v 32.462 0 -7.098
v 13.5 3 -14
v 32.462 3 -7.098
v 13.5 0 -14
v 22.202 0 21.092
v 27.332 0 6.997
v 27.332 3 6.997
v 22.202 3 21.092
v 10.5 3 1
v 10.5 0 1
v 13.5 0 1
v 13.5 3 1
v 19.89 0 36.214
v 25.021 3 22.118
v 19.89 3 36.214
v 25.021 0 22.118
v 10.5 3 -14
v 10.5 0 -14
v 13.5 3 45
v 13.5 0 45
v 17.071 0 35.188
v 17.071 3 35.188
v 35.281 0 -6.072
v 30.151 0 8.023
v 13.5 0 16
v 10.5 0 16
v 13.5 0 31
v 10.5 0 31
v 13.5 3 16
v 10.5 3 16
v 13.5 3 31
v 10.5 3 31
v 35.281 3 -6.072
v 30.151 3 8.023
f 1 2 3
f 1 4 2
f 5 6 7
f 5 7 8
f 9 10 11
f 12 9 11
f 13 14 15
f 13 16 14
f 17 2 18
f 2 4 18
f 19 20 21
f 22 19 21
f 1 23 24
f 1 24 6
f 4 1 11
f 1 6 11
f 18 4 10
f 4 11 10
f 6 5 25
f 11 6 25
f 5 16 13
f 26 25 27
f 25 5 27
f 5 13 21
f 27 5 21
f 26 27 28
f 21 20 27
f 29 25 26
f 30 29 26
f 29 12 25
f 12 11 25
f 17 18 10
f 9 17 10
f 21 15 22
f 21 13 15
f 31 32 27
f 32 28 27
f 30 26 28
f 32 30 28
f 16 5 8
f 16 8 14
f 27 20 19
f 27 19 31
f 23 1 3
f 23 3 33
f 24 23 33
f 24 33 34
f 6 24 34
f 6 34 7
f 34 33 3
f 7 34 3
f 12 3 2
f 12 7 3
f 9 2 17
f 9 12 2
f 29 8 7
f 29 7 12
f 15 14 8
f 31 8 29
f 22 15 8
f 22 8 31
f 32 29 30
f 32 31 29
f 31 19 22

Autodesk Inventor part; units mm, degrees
ref_plane "YZ Plane" through (0, 0, 0) normal (1, 0, 0) x (0, 1, 0)
ref_plane "XZ Plane" through (0, 0, 0) normal (0, 1, 0) x (-1, 0, 0)
ref_plane "XY Plane" through (0, 0, 0) normal (0, 0, 1) x (1, 0, 0)
sketch "Sketch1" plane through (0, 0, 0) normal (0, 1, 0) x (-1, 0, 0)
  line L0 (-13.5, -14) -> (-32.4622, -7.0983)
  line L1 (-13.5, -14) -> (-10.5, -14)
  line L2 (-10.5, -14) -> (-10.5, 1)
  line L3 (-10.5, 1) -> (-13.5, 1)
  line L4 (-13.5, 1) -> (-13.5, 16)
  line L5 (-13.5, 16) -> (-10.5, 16)
  line L6 (-10.5, 16) -> (-10.5, 31)
  line L7 (-10.5, 31) -> (-13.5, 31)
  line L8 (-13.5, 45) -> (-13.5, 31)
  line L9 (-13.5, 16) -> (-13.5, 1)
  line L10 (-32.4622, -7.0983) -> (-35.2813, -6.0723)
  line L11 (-35.2813, -6.0723) -> (-30.151, 8.0231)
  line L12 (-30.151, 8.0231) -> (-27.3319, 6.9971)
  line L13 (-27.3319, 6.9971) -> (-22.2016, 21.0925)
  line L14 (-22.2016, 21.0925) -> (-25.0207, 22.1185)
  line L15 (-25.0207, 22.1185) -> (-19.8904, 36.2139)
  line L16 (-19.8904, 36.2139) -> (-17.0713, 35.1879)
  line L17 (-13.5, 45) -> (-17.0713, 35.1879)
  line L18 (-22.2016, 21.0925) -> (-27.3319, 6.9971)
  point P0 (0, 0)
  dimension "d0" = 3
  dimension "d1" = 15
  dimension "d2" = 15
  dimension "d3" = 15
  dimension "d4" = 15
  dimension "d5" = 15
  dimension "d6" = 15
  dimension "d7" = 2.8191
extrude "Extrusion1" add sketch "Sketch1" along normal blind 3
properties part number "do_sensor_2"
